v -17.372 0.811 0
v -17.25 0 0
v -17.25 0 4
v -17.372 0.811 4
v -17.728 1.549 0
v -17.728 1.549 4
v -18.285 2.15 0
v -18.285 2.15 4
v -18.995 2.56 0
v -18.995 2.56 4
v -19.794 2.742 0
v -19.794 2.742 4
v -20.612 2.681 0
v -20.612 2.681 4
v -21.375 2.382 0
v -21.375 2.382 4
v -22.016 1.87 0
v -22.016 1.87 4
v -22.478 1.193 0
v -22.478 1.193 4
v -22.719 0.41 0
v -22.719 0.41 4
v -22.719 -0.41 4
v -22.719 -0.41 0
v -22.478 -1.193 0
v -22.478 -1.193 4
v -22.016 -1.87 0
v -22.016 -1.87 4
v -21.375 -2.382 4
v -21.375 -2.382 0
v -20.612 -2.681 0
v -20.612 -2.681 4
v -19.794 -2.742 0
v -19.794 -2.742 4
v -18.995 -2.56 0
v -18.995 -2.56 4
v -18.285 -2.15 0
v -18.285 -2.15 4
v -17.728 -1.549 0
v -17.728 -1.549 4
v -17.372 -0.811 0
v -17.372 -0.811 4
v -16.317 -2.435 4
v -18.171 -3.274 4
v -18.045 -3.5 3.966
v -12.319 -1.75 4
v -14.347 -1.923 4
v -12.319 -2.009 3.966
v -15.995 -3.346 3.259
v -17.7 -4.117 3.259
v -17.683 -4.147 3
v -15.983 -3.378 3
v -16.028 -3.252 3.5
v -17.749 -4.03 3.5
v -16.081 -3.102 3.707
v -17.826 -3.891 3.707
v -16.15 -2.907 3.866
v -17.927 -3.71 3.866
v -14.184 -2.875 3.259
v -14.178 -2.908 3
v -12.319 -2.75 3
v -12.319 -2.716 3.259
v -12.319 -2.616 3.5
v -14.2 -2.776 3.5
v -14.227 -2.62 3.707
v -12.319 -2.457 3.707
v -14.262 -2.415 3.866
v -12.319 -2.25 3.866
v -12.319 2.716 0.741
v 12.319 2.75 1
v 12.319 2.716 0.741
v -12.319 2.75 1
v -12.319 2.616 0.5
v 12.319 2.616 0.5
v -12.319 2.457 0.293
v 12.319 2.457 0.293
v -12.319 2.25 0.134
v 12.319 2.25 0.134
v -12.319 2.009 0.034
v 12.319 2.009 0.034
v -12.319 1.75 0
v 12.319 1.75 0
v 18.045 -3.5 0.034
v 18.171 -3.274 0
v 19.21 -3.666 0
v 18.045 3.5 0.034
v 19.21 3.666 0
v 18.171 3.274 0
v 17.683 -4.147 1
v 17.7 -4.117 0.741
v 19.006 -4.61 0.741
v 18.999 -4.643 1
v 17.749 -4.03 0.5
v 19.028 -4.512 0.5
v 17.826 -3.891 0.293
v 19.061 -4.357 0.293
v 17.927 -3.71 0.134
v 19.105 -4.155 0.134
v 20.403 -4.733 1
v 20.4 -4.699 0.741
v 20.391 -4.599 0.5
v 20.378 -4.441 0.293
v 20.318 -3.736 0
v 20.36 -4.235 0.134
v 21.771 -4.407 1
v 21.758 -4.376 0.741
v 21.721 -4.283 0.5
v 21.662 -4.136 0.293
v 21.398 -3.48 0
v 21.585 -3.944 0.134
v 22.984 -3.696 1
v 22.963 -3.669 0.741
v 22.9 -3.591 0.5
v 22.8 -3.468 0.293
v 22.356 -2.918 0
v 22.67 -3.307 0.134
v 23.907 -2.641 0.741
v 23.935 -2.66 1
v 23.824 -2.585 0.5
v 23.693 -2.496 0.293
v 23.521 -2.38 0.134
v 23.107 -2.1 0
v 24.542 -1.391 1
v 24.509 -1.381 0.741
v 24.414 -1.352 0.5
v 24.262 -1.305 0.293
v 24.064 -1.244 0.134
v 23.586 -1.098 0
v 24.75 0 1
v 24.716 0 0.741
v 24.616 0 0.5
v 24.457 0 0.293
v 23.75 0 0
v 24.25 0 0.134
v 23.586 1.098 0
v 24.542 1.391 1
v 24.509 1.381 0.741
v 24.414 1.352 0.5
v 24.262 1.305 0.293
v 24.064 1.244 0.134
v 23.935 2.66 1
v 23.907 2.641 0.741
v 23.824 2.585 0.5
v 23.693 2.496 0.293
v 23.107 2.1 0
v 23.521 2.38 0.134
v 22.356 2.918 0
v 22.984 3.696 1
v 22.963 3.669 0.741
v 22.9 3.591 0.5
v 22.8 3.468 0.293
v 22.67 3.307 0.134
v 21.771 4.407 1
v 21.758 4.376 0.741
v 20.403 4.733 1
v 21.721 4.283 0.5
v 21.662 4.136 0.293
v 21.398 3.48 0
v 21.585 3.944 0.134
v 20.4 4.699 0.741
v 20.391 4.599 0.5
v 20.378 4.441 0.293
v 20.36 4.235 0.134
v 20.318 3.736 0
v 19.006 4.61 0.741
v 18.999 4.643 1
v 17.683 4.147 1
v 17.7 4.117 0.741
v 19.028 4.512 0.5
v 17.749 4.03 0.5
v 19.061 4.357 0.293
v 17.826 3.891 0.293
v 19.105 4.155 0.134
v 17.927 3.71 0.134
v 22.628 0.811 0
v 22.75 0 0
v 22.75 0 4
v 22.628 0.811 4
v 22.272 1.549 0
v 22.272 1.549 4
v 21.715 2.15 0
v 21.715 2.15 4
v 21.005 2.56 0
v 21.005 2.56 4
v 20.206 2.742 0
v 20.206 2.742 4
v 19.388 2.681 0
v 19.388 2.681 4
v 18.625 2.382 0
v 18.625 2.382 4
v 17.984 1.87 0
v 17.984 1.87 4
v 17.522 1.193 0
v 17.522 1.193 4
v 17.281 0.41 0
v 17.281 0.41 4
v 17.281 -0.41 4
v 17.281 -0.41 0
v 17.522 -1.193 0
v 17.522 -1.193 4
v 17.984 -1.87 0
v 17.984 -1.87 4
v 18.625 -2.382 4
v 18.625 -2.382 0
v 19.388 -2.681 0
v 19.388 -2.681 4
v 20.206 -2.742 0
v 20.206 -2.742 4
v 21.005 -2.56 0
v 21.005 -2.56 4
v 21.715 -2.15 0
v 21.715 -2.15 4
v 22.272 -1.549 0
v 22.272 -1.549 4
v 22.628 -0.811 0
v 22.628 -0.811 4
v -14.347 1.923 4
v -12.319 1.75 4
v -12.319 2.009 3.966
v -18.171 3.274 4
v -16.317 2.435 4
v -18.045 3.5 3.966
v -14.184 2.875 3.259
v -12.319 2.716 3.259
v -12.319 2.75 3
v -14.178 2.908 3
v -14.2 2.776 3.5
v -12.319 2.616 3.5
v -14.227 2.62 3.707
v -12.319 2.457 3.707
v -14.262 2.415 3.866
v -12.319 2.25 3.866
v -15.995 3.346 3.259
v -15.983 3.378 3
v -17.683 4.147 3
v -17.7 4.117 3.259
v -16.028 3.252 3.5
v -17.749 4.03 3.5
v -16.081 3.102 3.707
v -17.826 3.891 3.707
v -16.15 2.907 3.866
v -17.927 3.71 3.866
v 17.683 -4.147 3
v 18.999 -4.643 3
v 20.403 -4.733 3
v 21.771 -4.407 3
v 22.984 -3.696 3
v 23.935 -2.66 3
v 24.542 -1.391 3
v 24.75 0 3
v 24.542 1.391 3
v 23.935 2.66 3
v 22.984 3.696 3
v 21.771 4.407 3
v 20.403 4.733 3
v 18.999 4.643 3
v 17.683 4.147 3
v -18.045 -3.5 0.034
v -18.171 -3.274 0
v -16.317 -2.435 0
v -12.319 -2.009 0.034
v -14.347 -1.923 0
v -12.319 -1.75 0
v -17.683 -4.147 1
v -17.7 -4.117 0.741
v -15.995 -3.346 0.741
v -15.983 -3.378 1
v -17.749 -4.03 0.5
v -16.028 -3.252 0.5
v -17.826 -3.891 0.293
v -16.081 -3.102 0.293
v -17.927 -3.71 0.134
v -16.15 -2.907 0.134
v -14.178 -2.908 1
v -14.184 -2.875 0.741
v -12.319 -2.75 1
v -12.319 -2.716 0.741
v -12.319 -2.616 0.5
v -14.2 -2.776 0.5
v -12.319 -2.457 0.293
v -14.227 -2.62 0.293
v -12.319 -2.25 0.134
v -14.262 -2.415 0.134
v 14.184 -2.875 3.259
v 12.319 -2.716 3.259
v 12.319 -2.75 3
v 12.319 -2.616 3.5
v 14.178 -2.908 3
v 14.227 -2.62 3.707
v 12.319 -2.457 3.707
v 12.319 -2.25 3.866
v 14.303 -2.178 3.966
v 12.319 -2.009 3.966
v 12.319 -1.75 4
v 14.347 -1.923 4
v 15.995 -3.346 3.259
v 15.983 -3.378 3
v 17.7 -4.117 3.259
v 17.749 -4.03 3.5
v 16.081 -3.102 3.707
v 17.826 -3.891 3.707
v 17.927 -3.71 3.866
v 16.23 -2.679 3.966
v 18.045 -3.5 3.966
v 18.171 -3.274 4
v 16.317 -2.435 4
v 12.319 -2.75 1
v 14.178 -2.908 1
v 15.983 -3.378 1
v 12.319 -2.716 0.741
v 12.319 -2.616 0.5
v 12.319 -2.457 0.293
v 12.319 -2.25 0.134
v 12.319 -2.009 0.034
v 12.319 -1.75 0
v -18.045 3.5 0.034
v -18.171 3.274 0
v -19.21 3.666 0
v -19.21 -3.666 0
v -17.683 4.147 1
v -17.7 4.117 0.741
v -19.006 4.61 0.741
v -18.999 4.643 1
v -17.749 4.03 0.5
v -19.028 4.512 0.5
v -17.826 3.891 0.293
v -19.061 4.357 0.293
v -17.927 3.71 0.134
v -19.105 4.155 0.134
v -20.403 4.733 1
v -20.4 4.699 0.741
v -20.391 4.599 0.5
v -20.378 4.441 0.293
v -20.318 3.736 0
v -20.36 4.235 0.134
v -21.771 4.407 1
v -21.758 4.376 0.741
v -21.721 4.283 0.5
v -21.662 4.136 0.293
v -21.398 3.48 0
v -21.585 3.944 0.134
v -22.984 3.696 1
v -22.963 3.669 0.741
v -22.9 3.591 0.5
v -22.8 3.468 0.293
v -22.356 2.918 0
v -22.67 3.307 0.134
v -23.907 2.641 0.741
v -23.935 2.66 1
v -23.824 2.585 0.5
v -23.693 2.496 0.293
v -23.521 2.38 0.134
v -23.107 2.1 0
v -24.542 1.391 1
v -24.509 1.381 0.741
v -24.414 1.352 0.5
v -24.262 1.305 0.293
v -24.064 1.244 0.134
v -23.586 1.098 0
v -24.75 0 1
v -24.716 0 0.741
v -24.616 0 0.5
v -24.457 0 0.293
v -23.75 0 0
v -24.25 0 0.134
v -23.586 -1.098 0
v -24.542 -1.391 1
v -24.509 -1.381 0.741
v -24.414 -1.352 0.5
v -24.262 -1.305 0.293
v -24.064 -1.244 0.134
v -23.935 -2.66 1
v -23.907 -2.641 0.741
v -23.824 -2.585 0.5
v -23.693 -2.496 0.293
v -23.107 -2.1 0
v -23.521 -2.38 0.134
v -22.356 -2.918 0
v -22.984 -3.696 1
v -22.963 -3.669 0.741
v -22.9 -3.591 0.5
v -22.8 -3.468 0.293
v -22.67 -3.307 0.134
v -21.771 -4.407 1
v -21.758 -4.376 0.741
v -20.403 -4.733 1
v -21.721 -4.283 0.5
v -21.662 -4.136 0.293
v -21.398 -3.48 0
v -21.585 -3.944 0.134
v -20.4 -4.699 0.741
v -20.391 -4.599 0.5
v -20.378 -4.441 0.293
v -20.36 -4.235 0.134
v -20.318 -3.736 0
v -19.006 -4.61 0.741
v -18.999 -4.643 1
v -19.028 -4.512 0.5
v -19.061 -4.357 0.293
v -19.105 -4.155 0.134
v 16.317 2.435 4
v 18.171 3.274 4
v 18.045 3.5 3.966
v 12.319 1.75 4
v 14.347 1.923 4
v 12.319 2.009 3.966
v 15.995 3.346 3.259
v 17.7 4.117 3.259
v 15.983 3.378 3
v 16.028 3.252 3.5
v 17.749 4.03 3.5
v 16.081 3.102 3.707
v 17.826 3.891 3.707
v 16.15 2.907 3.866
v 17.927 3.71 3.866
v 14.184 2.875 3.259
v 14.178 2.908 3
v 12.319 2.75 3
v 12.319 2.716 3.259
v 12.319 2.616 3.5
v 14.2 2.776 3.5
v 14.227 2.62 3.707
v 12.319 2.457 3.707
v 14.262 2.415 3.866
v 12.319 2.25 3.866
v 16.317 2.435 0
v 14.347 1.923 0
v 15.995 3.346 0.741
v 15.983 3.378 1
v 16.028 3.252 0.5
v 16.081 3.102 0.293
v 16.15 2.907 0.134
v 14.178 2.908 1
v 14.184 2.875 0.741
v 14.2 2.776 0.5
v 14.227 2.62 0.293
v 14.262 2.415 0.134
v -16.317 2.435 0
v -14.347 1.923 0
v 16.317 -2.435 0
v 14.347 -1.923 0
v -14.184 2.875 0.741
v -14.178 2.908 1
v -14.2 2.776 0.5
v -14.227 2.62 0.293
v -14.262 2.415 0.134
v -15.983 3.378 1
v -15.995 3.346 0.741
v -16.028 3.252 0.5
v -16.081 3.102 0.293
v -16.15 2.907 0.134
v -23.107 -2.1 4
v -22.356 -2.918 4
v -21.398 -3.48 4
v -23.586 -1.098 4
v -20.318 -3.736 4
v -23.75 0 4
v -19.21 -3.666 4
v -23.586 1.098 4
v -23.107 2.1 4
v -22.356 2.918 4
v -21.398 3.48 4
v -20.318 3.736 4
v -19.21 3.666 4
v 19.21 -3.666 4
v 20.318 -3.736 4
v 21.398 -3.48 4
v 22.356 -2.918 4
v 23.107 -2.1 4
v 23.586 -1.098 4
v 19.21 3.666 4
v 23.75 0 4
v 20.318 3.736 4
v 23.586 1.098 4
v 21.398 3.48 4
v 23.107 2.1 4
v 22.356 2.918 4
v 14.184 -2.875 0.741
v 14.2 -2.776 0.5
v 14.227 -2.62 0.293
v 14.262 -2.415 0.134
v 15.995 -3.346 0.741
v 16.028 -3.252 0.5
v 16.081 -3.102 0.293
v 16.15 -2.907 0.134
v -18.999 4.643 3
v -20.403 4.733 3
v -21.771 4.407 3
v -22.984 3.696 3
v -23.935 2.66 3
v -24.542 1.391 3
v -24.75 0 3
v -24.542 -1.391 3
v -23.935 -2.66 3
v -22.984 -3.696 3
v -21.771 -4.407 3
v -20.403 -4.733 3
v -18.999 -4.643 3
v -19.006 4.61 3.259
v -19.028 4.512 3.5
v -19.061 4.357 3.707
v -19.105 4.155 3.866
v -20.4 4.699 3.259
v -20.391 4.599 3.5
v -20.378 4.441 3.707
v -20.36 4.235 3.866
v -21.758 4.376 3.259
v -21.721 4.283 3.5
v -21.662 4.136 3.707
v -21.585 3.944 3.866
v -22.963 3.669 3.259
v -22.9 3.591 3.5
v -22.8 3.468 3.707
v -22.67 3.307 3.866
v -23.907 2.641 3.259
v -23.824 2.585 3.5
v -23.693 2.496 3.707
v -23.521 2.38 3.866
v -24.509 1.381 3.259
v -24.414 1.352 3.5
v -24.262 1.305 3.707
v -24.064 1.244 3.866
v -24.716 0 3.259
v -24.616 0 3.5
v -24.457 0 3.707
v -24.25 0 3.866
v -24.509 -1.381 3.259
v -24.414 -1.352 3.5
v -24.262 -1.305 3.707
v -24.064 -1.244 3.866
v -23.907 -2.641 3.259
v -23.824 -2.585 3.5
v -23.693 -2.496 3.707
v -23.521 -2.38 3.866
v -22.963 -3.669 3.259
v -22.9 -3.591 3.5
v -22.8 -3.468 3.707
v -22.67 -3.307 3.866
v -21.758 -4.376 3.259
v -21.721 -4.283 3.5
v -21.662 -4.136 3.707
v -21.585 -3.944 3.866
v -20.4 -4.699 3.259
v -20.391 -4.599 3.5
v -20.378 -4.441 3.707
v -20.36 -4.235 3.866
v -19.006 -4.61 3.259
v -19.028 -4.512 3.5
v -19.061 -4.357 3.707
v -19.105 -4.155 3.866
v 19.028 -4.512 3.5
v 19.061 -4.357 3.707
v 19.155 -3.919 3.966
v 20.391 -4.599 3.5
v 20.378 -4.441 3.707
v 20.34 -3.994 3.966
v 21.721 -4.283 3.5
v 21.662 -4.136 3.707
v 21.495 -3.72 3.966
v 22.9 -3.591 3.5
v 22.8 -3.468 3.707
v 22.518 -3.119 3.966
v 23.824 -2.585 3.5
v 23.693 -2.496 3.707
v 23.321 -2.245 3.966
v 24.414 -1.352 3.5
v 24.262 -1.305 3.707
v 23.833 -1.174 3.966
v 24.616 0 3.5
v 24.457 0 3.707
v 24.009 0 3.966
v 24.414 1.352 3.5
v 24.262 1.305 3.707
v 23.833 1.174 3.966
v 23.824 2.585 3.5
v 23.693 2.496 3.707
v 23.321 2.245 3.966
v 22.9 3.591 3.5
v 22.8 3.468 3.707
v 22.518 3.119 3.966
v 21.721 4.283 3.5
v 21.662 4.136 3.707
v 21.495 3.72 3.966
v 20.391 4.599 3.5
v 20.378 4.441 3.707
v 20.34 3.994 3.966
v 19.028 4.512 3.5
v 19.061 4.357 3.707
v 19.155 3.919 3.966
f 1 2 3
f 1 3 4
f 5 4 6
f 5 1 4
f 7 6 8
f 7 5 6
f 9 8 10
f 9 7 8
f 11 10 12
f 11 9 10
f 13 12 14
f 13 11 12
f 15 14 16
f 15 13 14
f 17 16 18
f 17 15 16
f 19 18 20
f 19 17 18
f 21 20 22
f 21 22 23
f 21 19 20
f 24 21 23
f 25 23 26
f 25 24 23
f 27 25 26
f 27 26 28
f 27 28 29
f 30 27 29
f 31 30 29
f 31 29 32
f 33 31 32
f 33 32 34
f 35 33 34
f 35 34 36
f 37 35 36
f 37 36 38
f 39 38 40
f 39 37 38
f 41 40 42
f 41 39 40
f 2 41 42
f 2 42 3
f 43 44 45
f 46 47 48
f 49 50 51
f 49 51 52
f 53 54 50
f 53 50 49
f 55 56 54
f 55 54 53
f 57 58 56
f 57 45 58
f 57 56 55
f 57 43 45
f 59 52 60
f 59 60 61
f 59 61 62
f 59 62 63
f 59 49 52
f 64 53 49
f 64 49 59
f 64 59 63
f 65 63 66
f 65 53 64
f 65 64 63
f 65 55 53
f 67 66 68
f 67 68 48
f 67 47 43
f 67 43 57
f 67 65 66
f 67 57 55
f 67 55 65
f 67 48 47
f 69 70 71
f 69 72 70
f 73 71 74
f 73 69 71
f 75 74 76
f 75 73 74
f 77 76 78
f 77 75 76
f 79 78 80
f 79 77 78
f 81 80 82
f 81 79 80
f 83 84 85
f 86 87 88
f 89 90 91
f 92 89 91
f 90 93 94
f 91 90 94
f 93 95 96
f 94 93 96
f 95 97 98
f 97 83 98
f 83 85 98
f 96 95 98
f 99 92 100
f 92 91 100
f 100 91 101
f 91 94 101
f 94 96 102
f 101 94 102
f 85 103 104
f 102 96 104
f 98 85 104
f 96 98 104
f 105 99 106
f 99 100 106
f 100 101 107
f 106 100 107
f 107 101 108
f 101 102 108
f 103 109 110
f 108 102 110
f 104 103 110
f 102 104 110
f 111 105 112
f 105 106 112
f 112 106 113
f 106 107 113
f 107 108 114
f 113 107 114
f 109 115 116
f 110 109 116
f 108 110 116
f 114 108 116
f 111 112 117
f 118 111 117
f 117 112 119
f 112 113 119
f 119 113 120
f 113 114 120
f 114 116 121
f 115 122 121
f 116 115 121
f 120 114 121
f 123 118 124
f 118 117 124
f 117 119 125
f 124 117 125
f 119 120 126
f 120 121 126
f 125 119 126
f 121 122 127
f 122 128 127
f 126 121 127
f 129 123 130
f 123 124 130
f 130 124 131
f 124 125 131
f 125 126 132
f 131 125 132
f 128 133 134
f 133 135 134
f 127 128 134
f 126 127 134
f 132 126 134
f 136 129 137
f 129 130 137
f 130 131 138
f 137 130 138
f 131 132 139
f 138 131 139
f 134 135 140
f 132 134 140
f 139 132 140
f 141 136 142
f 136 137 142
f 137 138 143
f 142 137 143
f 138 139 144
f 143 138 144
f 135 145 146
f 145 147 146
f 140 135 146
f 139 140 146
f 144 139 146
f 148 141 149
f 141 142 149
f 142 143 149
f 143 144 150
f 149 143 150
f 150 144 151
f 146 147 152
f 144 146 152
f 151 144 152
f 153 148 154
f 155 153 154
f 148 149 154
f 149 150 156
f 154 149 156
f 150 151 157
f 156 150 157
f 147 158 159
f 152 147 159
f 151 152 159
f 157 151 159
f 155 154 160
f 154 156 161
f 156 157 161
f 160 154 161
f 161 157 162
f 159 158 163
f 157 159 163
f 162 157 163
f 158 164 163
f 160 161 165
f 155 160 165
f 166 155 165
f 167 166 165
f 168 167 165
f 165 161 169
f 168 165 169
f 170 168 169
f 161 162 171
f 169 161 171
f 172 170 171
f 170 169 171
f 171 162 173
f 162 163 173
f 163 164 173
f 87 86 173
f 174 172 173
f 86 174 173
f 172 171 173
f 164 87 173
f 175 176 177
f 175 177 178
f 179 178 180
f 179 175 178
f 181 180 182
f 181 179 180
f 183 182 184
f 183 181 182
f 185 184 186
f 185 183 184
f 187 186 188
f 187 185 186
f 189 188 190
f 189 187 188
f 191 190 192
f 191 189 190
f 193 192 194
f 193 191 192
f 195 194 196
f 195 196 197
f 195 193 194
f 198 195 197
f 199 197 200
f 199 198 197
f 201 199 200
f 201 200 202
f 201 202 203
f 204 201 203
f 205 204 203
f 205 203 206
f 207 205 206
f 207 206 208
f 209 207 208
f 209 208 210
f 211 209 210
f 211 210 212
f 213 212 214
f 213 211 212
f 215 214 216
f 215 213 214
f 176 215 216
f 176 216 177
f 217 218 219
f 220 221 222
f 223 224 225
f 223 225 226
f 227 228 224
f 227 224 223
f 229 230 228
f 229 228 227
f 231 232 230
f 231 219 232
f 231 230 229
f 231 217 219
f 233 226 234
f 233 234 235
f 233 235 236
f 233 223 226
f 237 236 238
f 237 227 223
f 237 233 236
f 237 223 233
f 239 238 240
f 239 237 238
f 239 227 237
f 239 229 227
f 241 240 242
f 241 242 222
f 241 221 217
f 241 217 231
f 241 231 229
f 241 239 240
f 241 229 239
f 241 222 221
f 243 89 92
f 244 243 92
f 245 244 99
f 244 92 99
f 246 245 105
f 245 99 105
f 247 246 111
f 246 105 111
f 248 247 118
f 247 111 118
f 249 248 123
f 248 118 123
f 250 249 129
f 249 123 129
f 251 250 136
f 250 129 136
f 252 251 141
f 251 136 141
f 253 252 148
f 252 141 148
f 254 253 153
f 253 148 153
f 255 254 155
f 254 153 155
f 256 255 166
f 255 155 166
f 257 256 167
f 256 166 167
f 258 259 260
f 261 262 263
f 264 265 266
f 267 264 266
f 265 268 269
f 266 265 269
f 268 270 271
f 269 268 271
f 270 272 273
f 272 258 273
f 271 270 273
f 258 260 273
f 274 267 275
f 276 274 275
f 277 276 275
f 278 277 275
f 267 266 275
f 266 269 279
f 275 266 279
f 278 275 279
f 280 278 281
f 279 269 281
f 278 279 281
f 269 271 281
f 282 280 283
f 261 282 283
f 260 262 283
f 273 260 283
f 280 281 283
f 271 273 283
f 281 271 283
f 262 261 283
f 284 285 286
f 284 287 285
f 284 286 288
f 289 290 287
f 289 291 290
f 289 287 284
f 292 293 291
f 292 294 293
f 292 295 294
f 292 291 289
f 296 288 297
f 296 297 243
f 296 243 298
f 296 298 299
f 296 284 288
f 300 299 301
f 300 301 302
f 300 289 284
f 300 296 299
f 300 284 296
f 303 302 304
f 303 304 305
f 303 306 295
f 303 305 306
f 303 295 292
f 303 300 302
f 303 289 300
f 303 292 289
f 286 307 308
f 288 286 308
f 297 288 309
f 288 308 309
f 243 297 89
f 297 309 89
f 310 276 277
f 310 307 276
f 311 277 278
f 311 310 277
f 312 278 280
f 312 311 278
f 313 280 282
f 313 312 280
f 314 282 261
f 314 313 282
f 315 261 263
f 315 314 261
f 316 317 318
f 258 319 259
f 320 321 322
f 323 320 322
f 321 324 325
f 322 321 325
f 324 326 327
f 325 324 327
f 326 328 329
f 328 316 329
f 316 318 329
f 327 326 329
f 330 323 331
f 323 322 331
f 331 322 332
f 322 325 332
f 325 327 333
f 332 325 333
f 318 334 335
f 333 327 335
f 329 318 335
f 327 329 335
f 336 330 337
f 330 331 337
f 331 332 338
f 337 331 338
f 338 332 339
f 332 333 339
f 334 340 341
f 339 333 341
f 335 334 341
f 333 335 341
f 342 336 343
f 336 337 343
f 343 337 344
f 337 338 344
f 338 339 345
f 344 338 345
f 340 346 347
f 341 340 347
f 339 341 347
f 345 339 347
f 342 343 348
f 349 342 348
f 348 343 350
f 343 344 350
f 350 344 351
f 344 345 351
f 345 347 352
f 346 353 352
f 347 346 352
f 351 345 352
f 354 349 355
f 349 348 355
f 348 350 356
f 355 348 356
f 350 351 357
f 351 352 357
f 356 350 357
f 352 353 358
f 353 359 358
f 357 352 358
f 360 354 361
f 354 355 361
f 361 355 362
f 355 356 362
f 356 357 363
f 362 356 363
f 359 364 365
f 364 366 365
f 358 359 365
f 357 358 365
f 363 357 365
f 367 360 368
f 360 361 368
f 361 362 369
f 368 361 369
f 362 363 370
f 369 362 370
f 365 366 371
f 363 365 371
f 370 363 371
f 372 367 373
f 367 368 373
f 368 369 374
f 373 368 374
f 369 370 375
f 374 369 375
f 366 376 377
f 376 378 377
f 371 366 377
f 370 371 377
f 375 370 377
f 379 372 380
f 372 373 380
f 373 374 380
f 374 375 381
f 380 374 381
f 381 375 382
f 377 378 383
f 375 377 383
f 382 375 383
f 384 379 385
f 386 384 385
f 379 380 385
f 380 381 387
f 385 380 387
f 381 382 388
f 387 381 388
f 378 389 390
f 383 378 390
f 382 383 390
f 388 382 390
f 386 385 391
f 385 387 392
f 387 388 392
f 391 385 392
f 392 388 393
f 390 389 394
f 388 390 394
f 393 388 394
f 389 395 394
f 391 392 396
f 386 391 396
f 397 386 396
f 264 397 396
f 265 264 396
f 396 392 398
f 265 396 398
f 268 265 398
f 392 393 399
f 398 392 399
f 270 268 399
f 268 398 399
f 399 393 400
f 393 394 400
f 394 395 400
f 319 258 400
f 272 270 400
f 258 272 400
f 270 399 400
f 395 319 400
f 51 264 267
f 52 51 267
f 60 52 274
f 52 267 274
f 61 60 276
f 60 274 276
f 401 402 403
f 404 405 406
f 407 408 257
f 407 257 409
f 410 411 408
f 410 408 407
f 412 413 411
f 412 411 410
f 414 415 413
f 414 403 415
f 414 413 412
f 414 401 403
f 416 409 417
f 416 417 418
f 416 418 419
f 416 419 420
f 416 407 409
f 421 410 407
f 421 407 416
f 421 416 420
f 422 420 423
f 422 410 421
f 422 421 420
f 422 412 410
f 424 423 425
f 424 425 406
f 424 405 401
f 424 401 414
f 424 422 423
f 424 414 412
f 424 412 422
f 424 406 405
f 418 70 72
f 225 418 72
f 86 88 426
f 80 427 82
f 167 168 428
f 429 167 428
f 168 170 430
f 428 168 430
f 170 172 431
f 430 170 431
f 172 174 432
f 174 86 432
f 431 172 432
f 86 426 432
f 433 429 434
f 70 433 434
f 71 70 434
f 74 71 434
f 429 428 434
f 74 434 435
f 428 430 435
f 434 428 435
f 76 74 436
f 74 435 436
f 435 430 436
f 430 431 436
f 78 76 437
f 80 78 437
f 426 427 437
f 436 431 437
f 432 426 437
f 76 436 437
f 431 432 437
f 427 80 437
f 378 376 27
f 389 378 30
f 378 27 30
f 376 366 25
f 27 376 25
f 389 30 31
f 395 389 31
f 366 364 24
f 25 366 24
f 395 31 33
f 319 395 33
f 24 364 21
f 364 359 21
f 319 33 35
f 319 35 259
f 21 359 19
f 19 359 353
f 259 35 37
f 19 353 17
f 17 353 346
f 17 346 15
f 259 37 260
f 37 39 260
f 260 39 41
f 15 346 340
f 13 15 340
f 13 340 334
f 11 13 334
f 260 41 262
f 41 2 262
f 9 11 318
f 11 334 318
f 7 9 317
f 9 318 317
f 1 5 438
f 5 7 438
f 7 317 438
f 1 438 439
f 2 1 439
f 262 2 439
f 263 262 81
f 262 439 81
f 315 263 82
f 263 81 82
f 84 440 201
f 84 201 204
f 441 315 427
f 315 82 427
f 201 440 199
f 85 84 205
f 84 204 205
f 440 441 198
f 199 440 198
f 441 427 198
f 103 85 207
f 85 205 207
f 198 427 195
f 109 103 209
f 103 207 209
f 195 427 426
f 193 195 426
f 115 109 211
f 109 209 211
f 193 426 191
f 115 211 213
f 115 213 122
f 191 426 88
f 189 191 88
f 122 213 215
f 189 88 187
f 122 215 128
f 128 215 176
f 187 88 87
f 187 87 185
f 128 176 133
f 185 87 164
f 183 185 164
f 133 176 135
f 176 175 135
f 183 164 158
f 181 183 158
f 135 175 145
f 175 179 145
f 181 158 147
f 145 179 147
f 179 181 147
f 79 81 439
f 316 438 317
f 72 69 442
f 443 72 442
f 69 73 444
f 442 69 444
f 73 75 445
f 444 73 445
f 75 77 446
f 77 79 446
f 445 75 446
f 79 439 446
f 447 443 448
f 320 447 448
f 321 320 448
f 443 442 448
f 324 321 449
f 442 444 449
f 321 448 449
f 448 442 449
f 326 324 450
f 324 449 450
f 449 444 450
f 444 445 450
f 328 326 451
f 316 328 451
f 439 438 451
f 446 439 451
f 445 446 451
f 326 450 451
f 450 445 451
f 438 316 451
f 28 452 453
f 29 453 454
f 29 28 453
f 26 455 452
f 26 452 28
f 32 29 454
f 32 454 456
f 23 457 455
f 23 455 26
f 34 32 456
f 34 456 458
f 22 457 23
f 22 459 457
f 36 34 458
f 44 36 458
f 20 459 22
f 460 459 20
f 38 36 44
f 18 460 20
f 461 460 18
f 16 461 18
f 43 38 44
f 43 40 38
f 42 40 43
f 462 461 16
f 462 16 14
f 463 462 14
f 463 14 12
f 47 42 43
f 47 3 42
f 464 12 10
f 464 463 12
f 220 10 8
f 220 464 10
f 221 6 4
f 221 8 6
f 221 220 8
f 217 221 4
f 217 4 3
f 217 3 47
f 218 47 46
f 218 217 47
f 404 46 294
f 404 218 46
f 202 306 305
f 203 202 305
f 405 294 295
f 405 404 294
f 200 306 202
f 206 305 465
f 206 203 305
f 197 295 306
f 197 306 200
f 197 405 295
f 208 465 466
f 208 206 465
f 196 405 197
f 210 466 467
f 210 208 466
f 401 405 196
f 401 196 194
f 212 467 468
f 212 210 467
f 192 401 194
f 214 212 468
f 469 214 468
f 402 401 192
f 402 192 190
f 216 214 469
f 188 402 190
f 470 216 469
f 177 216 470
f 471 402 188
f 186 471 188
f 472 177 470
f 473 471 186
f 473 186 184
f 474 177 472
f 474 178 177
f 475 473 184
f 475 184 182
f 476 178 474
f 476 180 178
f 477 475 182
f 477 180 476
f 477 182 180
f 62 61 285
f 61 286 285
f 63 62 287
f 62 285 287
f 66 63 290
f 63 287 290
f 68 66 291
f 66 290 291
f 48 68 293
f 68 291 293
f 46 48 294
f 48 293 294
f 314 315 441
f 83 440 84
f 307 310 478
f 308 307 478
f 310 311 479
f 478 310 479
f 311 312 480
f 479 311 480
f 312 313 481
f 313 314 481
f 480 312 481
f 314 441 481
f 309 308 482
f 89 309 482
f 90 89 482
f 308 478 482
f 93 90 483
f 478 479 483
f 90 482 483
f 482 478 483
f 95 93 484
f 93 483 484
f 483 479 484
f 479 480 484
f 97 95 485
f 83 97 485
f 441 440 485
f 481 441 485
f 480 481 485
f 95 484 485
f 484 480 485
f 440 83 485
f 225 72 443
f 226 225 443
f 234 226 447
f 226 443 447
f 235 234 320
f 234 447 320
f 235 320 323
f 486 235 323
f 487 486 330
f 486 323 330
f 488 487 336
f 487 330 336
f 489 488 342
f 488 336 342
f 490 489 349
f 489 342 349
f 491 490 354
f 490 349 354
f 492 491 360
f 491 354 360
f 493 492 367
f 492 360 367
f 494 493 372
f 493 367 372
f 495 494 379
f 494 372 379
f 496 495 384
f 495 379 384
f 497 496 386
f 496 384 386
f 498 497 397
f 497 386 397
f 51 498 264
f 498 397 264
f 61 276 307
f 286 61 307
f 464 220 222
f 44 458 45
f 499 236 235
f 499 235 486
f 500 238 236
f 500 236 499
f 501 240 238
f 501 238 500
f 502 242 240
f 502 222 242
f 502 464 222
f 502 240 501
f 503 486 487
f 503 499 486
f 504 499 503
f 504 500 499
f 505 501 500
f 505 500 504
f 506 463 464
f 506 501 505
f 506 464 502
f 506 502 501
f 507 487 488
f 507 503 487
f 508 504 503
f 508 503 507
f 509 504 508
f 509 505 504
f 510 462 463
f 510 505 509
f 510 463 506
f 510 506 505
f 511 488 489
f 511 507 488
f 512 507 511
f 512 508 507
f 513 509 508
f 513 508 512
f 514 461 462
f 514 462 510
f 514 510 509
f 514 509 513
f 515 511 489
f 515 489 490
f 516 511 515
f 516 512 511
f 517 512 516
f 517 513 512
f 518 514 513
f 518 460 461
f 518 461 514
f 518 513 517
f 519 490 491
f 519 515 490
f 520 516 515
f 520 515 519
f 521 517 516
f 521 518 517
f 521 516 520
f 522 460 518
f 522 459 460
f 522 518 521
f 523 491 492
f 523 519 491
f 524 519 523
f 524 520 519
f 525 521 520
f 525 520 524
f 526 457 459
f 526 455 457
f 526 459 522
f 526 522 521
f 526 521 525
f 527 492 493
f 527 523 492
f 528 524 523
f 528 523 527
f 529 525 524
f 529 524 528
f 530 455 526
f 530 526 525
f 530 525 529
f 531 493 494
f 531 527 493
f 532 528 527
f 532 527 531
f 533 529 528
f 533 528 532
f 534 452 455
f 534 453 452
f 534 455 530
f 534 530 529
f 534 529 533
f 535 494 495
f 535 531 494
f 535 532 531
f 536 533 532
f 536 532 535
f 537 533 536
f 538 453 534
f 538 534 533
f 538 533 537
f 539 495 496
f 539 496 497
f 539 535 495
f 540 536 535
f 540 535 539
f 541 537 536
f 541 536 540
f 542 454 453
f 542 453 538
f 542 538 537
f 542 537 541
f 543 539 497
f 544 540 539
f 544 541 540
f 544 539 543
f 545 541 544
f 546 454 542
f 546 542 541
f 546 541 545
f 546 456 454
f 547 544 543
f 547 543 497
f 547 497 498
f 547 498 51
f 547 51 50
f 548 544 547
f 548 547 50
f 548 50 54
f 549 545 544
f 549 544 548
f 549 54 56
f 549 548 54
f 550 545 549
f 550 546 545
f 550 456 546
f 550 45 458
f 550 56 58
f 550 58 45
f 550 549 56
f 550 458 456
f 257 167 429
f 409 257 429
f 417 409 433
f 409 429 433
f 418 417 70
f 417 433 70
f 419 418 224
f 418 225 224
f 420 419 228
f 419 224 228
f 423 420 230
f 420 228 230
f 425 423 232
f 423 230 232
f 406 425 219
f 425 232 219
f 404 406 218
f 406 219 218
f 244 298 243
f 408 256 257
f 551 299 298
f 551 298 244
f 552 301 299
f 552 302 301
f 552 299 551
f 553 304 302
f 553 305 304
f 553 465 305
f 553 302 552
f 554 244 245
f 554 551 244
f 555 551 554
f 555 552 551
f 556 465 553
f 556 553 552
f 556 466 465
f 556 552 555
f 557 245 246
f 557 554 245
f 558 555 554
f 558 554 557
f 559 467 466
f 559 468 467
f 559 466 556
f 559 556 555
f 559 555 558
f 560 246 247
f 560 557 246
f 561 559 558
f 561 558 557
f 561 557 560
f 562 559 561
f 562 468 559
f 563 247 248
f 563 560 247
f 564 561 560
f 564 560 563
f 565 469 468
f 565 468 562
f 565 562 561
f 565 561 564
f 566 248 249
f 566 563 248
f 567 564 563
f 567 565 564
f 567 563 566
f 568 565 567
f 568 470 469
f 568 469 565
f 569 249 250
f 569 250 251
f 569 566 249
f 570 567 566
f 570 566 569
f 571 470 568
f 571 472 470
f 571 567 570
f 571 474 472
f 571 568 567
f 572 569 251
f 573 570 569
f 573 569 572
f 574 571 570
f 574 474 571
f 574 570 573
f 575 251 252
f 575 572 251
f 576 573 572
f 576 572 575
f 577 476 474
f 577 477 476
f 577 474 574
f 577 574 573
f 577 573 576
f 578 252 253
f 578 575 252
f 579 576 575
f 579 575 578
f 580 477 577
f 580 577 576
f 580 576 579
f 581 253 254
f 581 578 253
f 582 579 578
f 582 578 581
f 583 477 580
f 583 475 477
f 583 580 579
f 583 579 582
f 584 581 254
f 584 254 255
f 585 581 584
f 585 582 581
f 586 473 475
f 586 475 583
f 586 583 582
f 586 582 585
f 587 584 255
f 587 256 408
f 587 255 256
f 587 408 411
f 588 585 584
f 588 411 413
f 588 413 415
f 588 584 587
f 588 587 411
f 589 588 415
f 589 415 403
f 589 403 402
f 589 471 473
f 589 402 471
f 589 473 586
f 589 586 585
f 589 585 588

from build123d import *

# Parameters (mm, degrees)
SKETCH1_R           = 2.75
BOSS_EXTRUDE1_DEPTH = 4
FILLET1_R           = 1


with BuildPart() as part:
    # Sketch1 → Boss-Extrude1 (new body)
    with BuildSketch(Plane.XY):
        with BuildLine():
            Line((-12.318854252, -2.75), (12.318854252, -2.75))
            ThreePointArc((12.318854252, -2.75), (15.090593721, -3.104932583), (17.683463981, -4.146825397))
            ThreePointArc((17.683463981, -4.146825397), (24.75, 0), (17.683463981, 4.146825397))
            ThreePointArc((17.683463981, 4.146825397), (15.090593721, 3.104932583), (12.318854252, 2.75))
            Line((12.318854252, 2.75), (-12.318854252, 2.75))
            ThreePointArc((-12.318854252, 2.75), (-15.090593721, 3.104932583), (-17.683463981, 4.146825397))
            ThreePointArc((-17.683463981, 4.146825397), (-24.75, 0), (-17.683463981, -4.146825397))
            ThreePointArc((-17.683463981, -4.146825397), (-15.090593721, -3.104932583), (-12.318854252, -2.75))
        make_face()
        with Locations((-20, 0)):
            Circle(SKETCH1_R, mode=Mode.SUBTRACT)
        with Locations((20, 0)):
            Circle(SKETCH1_R, mode=Mode.SUBTRACT)
    extrude(amount=BOSS_EXTRUDE1_DEPTH)

    # Fillet1
    fillet1_edges = [part.edges().sort_by_distance(p)[0] for p in [
        (15.090593721, 3.104932583, 0),
        (24.75, 0, 0),
        (15.090593721, -3.104932583, 0),
        (0, -2.75, 0),
        (24.75, 0, 4),
        (15.090593721, 3.104932583, 4),
        (0, 2.75, 4),
        (-15.090593721, 3.104932583, 4),
        (-24.75, 0, 4),
        (-15.090593721, -3.104932583, 4),
        (0, -2.75, 4),
        (-15.090593721, -3.104932583, 0),
        (15.090593721, -3.104932583, 4),
        (-24.75, 0, 0),
        (-15.090593721, 3.104932583, 0),
        (0, 2.75, 0),
    ]]
    fillet(fillet1_edges, radius=FILLET1_R)


solid = part.part
